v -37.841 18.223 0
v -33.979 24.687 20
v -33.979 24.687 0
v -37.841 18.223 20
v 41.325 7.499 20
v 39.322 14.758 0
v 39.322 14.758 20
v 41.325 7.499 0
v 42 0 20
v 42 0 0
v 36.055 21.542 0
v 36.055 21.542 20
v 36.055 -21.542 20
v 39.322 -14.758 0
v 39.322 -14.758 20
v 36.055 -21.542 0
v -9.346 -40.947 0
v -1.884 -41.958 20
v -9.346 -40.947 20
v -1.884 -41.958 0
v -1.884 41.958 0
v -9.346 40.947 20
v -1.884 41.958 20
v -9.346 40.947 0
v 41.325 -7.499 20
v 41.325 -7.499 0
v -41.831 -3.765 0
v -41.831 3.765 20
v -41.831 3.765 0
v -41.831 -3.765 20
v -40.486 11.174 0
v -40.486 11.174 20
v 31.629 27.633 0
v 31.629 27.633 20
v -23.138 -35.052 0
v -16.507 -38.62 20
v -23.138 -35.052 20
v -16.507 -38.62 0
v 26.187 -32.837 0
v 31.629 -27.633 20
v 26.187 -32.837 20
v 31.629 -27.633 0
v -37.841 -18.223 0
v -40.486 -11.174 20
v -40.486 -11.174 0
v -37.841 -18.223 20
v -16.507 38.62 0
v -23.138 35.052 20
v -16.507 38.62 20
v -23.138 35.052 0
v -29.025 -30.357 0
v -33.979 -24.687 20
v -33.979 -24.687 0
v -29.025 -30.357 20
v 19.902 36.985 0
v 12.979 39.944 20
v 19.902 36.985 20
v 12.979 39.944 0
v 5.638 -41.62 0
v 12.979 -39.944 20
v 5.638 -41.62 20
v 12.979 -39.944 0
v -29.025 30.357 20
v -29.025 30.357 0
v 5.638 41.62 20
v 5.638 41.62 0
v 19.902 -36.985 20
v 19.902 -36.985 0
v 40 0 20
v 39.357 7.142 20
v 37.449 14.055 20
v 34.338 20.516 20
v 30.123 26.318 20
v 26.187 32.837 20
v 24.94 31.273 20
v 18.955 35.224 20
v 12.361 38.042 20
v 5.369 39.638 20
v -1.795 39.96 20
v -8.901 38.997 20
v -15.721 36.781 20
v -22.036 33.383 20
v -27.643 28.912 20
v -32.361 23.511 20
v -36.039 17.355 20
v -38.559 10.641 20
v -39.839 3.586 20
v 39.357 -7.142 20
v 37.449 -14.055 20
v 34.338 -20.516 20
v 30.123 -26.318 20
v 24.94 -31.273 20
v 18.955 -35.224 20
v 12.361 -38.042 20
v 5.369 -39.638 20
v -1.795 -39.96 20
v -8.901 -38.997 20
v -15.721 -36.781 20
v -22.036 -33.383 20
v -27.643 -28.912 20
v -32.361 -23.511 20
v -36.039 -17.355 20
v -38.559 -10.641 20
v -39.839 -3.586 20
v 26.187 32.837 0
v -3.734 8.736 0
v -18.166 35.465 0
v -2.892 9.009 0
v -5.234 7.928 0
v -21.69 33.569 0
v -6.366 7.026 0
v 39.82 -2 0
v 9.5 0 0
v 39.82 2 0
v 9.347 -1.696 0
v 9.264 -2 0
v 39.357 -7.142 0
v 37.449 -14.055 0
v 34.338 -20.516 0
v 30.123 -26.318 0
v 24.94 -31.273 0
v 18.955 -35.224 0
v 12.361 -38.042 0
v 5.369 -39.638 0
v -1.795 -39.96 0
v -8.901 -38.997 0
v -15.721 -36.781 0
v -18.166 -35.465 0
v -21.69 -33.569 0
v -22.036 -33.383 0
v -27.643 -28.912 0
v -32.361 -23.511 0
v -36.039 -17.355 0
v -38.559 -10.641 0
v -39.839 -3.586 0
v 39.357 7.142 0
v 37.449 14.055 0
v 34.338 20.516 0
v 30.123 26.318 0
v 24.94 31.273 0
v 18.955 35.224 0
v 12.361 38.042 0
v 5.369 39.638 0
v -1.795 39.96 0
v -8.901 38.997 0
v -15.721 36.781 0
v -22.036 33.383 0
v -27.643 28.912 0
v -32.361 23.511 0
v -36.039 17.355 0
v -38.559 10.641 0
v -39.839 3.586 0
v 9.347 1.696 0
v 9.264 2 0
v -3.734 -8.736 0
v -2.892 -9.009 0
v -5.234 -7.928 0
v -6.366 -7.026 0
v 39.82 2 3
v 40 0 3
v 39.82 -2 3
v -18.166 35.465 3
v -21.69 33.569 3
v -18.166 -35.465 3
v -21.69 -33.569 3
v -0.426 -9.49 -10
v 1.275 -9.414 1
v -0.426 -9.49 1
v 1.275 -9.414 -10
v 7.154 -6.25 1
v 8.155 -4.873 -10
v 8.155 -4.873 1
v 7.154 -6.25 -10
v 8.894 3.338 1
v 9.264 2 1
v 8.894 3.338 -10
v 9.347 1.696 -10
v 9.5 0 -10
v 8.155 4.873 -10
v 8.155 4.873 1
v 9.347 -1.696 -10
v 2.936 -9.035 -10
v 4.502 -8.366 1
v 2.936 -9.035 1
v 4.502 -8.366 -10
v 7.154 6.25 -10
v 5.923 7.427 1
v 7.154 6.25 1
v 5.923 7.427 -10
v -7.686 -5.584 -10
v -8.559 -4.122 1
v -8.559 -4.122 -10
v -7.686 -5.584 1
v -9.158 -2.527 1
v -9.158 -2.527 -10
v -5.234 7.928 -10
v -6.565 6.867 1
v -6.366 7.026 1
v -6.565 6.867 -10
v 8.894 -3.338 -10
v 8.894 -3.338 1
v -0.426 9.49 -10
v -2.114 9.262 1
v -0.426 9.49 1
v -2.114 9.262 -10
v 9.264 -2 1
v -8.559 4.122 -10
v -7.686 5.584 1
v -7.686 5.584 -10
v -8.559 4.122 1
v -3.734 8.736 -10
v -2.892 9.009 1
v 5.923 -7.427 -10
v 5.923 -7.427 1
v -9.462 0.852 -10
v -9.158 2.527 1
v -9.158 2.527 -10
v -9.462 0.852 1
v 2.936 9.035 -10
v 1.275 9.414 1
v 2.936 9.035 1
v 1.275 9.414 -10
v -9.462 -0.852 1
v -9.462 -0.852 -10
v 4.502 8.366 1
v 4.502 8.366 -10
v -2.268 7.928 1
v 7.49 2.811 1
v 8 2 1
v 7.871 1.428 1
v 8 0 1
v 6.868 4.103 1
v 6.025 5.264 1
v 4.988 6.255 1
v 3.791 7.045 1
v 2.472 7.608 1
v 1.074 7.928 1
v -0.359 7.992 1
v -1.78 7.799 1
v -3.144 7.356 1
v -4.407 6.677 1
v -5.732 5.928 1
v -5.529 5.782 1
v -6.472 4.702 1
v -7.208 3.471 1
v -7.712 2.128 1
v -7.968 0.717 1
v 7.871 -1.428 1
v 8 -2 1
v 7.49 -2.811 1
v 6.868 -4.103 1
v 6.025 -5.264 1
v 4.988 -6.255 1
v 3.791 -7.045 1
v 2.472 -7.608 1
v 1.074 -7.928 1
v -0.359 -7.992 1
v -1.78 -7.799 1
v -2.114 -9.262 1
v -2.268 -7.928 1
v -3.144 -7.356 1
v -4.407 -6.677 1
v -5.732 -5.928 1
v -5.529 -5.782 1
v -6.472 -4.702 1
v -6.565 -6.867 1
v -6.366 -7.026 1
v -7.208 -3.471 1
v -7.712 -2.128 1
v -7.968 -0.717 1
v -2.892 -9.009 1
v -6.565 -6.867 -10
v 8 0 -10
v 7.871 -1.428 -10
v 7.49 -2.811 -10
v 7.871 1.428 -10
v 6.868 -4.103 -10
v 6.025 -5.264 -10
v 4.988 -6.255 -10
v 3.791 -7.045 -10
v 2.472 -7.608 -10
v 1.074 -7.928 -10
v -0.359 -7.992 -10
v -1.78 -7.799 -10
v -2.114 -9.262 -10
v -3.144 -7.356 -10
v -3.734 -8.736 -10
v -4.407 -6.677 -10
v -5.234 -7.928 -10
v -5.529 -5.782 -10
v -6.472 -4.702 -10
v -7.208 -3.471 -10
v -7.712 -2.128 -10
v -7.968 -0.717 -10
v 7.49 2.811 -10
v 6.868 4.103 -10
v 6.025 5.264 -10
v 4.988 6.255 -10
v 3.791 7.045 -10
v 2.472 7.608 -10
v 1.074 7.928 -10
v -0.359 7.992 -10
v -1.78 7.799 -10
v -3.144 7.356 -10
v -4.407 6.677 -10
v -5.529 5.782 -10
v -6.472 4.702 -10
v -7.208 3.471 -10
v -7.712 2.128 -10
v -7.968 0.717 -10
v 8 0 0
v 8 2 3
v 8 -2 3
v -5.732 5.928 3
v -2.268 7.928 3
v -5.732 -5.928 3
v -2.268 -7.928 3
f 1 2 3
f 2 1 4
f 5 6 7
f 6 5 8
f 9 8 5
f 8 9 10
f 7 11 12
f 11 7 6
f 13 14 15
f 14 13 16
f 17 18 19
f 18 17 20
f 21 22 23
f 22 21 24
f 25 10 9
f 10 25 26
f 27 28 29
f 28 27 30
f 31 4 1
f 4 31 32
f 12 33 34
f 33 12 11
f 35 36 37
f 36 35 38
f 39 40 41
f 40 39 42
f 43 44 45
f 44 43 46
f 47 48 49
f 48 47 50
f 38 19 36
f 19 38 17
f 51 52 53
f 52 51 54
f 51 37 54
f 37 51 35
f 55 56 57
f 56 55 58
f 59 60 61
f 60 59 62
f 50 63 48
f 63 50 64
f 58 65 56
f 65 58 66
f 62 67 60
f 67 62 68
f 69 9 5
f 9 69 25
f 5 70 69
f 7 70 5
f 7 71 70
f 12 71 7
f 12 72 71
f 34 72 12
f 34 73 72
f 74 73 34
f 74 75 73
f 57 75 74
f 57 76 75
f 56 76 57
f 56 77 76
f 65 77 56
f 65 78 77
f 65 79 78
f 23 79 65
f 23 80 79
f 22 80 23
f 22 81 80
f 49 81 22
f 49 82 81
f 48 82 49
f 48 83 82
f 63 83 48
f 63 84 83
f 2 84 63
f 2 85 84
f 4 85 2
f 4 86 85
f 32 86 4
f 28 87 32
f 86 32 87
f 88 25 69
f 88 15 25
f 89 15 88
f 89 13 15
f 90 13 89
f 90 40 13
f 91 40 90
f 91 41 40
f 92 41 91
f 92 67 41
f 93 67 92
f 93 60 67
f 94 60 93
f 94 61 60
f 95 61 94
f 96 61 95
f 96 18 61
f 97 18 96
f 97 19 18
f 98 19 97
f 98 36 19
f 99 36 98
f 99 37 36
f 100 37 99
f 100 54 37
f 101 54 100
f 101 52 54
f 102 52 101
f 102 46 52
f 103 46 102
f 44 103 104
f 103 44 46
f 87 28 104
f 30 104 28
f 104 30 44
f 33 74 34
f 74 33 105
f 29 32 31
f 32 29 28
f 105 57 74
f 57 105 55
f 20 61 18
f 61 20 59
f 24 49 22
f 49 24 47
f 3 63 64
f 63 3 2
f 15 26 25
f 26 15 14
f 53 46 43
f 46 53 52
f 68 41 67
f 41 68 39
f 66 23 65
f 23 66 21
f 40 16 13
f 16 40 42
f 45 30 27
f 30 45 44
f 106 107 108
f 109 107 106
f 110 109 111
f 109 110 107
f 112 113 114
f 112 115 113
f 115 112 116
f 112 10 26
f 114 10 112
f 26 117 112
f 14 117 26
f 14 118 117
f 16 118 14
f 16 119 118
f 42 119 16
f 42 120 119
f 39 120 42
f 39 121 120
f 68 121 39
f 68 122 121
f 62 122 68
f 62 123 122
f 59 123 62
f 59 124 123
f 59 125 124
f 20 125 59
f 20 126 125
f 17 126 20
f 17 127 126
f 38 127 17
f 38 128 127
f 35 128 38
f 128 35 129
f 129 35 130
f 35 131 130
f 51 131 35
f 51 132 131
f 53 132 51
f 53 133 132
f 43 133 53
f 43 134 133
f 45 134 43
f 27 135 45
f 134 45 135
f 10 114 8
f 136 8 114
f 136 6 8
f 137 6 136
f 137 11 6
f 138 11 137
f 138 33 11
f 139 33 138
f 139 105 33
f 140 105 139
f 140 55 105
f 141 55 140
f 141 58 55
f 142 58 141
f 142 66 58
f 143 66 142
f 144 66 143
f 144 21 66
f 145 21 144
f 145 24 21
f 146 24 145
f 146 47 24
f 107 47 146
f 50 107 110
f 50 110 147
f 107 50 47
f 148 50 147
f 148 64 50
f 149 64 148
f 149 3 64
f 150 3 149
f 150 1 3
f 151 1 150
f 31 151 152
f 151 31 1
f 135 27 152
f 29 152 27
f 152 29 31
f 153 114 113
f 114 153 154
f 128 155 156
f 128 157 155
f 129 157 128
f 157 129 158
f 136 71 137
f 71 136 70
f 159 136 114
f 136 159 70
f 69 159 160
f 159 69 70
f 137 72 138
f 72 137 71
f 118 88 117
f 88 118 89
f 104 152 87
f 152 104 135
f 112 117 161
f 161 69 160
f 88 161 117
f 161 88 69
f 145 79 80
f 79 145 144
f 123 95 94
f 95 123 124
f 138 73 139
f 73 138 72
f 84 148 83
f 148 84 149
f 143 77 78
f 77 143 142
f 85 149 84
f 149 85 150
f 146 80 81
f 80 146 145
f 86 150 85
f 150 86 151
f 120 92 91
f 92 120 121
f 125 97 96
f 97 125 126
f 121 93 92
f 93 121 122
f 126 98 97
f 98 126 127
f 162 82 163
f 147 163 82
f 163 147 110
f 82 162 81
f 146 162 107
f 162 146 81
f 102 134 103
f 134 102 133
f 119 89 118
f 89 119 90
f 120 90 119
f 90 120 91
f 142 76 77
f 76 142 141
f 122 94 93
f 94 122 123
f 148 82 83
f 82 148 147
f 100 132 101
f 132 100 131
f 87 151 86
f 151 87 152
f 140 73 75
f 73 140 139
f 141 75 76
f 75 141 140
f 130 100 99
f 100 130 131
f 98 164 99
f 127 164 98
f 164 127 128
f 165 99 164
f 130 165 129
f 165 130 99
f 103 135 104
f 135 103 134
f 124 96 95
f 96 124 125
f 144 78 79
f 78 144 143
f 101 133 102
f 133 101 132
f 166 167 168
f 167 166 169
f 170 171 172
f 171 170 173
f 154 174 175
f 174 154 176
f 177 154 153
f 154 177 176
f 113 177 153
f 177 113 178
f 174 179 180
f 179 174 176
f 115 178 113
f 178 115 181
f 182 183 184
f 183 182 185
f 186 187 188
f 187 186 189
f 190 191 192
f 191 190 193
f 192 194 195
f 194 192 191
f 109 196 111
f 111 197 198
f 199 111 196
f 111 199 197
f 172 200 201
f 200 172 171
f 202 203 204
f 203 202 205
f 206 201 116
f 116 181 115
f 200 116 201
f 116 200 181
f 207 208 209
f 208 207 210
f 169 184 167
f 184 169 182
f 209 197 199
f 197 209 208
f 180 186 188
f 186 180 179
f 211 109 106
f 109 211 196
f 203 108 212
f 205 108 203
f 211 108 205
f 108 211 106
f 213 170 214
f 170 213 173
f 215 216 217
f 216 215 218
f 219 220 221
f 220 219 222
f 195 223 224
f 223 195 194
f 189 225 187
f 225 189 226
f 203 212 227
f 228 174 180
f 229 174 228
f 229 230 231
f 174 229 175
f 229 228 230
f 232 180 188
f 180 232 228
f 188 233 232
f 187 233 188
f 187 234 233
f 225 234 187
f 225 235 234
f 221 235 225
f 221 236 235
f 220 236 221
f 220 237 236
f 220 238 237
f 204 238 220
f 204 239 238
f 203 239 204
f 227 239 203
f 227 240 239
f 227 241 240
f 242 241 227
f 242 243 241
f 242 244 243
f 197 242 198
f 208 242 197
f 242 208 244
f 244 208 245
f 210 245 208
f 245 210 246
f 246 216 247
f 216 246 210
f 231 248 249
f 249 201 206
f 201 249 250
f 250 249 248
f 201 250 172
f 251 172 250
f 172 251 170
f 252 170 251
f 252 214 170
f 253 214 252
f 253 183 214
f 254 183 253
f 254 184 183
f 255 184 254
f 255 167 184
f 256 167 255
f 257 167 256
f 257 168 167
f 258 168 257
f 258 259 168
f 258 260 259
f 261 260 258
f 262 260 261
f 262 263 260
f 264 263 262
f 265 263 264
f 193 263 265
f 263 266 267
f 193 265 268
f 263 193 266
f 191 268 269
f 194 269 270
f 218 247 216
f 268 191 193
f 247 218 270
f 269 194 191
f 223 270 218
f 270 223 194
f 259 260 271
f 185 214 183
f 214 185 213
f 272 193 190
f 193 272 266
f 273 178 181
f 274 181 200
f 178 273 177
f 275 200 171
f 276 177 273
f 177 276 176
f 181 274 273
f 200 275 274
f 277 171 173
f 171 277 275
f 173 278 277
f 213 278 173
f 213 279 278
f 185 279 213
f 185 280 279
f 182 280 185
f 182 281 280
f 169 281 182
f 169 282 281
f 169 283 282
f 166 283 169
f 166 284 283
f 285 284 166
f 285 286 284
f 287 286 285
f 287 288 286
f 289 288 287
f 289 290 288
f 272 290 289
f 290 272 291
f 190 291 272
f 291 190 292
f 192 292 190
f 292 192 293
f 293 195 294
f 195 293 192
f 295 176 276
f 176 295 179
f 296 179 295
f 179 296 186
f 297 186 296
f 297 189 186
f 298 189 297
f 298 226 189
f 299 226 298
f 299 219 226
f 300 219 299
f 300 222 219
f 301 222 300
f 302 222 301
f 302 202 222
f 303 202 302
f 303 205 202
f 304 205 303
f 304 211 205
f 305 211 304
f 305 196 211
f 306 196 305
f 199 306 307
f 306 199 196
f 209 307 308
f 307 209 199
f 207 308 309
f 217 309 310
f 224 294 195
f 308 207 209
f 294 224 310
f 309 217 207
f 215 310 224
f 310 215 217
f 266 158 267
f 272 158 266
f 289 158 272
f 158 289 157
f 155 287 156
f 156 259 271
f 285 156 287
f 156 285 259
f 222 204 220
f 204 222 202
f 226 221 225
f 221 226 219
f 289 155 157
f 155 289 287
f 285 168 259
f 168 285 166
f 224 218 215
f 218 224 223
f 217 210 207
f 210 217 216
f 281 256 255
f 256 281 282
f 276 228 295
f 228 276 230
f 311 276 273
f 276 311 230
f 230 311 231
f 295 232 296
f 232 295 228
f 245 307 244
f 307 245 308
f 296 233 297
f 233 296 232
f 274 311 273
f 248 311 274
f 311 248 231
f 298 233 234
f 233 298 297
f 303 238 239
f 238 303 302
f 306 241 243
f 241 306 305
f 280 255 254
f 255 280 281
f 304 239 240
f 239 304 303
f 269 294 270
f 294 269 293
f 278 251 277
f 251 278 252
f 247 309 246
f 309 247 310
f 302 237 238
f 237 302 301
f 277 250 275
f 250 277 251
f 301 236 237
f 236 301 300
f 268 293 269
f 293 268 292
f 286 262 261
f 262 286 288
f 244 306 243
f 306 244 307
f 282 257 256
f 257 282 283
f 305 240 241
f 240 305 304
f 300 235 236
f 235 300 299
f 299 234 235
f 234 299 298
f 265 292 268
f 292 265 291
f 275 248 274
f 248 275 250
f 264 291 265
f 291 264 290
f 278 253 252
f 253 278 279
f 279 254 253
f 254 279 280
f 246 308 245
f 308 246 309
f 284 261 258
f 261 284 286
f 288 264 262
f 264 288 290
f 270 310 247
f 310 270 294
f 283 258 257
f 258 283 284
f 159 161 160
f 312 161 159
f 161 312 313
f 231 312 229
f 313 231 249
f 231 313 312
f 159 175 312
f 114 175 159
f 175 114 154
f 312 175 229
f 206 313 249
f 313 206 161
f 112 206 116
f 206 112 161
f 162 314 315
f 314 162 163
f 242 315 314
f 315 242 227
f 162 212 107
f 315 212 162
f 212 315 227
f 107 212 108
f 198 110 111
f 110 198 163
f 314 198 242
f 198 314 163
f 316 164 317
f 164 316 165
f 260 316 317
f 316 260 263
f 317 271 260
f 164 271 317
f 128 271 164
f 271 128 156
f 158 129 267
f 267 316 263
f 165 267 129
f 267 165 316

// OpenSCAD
//
// A fixture to support a ball while drilling it.

center_hole_d = 19.0;

module main () {
    difference () {
        cylinder(20.0, r=(40.0 + 2.0), $fn=35);
        translate([0, 0, -0.01])
            cylinder(20.0 + 0.02, r=(40.0 - 0), $fn=35);
    }

    translate([0, 0, -10.0]) {
        difference () {
            cylinder(11.0, r=center_hole_d/2, $fn=35);
            translate([0, 0, -0.01])
                cylinder(11.0 + 0.02, r=(center_hole_d/2 - 1.5), $fn=35);
        }
    }

    for (angle = [0 : 120 : 300]) {
        rotate(angle, [0,0,1]) {
            translate([8.0, (4.0/2)*-1, 0])
                cube([40.5 - 8.0, 4.0, 3.0]);
        }
    }
}

main();
